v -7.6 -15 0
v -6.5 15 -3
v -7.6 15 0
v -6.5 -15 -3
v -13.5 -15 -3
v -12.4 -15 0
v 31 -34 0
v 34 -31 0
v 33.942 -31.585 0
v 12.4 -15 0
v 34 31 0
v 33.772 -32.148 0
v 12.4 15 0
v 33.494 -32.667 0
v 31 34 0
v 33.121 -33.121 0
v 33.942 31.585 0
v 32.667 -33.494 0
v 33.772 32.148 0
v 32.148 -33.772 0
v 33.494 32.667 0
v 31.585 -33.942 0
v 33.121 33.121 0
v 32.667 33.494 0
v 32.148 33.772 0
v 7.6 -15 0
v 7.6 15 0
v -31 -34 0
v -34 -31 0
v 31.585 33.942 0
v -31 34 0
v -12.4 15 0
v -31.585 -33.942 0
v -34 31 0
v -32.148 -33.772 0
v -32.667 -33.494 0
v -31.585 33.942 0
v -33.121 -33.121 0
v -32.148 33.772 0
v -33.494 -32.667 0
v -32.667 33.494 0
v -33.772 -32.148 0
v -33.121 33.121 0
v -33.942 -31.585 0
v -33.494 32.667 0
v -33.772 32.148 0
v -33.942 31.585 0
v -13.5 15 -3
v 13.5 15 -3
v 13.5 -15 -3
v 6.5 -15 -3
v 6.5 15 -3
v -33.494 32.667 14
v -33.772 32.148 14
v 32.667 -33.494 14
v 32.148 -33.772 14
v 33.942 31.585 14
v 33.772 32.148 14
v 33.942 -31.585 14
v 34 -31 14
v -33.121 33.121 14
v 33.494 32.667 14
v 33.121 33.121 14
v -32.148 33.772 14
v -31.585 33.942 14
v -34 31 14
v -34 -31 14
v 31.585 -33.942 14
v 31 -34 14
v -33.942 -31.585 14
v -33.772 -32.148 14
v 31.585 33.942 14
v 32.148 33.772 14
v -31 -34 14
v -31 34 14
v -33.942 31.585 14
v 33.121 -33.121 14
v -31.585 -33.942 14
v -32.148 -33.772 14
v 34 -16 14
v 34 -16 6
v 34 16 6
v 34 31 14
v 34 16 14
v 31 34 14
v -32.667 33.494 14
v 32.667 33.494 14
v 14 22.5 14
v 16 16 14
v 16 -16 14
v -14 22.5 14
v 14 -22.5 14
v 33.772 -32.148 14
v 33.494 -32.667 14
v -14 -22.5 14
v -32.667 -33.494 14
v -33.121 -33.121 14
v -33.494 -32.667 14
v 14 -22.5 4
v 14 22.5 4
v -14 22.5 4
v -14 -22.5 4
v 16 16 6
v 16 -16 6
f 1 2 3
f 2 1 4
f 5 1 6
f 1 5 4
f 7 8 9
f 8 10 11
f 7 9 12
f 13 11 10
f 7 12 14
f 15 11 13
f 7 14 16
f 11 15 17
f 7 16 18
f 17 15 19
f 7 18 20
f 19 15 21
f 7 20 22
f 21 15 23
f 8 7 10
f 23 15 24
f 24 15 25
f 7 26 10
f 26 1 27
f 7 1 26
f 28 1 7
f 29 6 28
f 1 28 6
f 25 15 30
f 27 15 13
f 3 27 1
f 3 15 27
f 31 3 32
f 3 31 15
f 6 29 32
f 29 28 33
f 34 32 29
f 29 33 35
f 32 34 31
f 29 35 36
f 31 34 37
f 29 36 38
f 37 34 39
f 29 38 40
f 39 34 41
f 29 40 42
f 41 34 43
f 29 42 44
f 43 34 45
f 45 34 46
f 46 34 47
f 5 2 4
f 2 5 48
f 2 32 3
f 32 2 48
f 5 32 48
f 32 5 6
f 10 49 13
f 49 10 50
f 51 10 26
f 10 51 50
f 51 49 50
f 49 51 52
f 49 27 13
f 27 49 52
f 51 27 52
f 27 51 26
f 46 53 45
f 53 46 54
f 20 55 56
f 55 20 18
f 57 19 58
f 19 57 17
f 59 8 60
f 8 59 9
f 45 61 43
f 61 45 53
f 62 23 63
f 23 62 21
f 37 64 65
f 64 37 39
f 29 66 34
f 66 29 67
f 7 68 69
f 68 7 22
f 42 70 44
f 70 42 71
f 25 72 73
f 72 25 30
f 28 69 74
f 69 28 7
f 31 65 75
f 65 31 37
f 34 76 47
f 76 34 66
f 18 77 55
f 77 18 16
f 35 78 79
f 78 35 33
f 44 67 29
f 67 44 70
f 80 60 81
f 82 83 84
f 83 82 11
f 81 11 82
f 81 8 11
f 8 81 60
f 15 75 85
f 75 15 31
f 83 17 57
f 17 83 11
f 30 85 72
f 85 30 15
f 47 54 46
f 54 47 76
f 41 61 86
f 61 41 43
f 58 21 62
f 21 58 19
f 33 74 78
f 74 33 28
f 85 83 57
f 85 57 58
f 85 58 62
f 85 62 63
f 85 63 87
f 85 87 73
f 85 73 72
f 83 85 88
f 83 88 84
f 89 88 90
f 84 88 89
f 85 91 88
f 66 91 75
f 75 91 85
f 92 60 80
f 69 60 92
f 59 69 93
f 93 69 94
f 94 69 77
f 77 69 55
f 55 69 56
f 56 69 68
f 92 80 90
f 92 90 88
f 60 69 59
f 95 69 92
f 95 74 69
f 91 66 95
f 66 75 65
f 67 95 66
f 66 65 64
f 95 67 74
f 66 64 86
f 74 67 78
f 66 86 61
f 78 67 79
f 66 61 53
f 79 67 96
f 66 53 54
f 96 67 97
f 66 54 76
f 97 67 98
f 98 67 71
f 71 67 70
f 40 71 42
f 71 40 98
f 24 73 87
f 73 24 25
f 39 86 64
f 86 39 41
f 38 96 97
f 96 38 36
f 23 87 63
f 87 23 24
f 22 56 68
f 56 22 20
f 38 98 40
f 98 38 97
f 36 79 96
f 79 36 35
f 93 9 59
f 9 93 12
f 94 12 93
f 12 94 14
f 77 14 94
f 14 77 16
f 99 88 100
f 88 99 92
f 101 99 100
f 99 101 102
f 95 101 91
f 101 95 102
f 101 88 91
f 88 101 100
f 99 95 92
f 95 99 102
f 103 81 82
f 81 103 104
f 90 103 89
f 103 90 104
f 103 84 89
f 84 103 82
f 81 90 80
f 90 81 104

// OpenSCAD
// file: rm_common.scad
// RobotMind Rev A: one slide-in interface for every payload carrier.
// Dimensions are mm; tune clearance on a short fit coupon before full prints.
$fn = 32;

RM_EPS = 0.1;
RM_CLEARANCE = 0.28;
RM_M3_CLEARANCE = 3.4;

RM_DOCK_W = 32;
RM_DOCK_L = 36;
RM_DOCK_H = 8;
RM_RAIL_X = 10;
RM_RAIL_ROOT = 4.8;
RM_RAIL_HEAD = 7.0;
RM_RAIL_H = 3.0;
RM_RAIL_L = 30;

assert(RM_RAIL_HEAD > RM_RAIL_ROOT, "Rail must retain the carrier");
assert(RM_DOCK_H > RM_RAIL_H, "Dock needs material below the rail");
assert(RM_RAIL_L + 2*RM_CLEARANCE < RM_DOCK_L,
       "Rail needs an open insertion end and rear stop");

module rounded_box(size=[20,20,3], r=2) {
  linear_extrude(height=size[2])
    offset(r=r) offset(delta=-r) square([size[0],size[1]]);
}

// The profile is narrow at the carrier root and wider at its free end.
module rail_profile(root=RM_RAIL_ROOT, head=RM_RAIL_HEAD, h=RM_RAIL_H) {
  polygon(points=[[-root/2,0], [root/2,0], [head/2,h], [-head/2,h]]);
}

// Runs along +Y and projects below Z=0. Carriers place this at their underside.
module male_rail(length=RM_RAIL_L) {
  translate([0,-length/2,0]) rotate([-90,0,0])
    linear_extrude(height=length) rail_profile();
}

module male_interface() {
  for(x=[-RM_RAIL_X,RM_RAIL_X])
    translate([x,0,0]) male_rail();
}

// Matching void, open at the front (-Y); material at +Y is the hard stop.
module rail_channel(length=RM_RAIL_L+2*RM_CLEARANCE) {
  translate([0,-RM_DOCK_L/2-RM_EPS,RM_DOCK_H+RM_EPS]) rotate([-90,0,0])
    linear_extrude(height=length)
      rail_profile(RM_RAIL_ROOT+2*RM_CLEARANCE,
                   RM_RAIL_HEAD+2*RM_CLEARANCE,
                   RM_RAIL_H+RM_EPS);
}

module universal_dock() {
  difference() {
    translate([-RM_DOCK_W/2,-RM_DOCK_L/2,0])
      rounded_box([RM_DOCK_W,RM_DOCK_L,RM_DOCK_H],3);
    for(x=[-RM_RAIL_X,RM_RAIL_X]) translate([x,0,0]) rail_channel();
    for(x=[-11,11], y=[-11,11])
      translate([x,y,-RM_EPS]) cylinder(h=RM_DOCK_H+2*RM_EPS,d=RM_M3_CLEARANCE);
  }
}

// Place a carrier's Z=0 plane at the dock surface; its rails fill the recess.
function docked_carrier_z() = RM_DOCK_H;
// Centre position after the rail reaches the rear stop.
function docked_carrier_y() = -RM_DOCK_L/2 - RM_EPS +
                              RM_RAIL_L/2 + 2*RM_CLEARANCE;
// main file
include <rm_common.scad>

// Provisional board envelope: measure antenna and connector keep-outs first.
TAG = 60;
PCB = [28,45,8];
W = max(TAG+8, PCB[0]+8);
H = max(TAG+8, PCB[1]+8);
DEPTH = 14;

difference() {
  union() {
    translate([-W/2,-H/2,0]) rounded_box([W,H,DEPTH],3);
    male_interface();
  }
  // Open rear cavity preserves the front face for the printed AprilTag.
  translate([-PCB[0]/2,-PCB[1]/2,4]) cube([PCB[0],PCB[1],DEPTH+RM_EPS]);
  translate([W/2-18,-16,6]) cube([20,32,DEPTH+RM_EPS]);
}
